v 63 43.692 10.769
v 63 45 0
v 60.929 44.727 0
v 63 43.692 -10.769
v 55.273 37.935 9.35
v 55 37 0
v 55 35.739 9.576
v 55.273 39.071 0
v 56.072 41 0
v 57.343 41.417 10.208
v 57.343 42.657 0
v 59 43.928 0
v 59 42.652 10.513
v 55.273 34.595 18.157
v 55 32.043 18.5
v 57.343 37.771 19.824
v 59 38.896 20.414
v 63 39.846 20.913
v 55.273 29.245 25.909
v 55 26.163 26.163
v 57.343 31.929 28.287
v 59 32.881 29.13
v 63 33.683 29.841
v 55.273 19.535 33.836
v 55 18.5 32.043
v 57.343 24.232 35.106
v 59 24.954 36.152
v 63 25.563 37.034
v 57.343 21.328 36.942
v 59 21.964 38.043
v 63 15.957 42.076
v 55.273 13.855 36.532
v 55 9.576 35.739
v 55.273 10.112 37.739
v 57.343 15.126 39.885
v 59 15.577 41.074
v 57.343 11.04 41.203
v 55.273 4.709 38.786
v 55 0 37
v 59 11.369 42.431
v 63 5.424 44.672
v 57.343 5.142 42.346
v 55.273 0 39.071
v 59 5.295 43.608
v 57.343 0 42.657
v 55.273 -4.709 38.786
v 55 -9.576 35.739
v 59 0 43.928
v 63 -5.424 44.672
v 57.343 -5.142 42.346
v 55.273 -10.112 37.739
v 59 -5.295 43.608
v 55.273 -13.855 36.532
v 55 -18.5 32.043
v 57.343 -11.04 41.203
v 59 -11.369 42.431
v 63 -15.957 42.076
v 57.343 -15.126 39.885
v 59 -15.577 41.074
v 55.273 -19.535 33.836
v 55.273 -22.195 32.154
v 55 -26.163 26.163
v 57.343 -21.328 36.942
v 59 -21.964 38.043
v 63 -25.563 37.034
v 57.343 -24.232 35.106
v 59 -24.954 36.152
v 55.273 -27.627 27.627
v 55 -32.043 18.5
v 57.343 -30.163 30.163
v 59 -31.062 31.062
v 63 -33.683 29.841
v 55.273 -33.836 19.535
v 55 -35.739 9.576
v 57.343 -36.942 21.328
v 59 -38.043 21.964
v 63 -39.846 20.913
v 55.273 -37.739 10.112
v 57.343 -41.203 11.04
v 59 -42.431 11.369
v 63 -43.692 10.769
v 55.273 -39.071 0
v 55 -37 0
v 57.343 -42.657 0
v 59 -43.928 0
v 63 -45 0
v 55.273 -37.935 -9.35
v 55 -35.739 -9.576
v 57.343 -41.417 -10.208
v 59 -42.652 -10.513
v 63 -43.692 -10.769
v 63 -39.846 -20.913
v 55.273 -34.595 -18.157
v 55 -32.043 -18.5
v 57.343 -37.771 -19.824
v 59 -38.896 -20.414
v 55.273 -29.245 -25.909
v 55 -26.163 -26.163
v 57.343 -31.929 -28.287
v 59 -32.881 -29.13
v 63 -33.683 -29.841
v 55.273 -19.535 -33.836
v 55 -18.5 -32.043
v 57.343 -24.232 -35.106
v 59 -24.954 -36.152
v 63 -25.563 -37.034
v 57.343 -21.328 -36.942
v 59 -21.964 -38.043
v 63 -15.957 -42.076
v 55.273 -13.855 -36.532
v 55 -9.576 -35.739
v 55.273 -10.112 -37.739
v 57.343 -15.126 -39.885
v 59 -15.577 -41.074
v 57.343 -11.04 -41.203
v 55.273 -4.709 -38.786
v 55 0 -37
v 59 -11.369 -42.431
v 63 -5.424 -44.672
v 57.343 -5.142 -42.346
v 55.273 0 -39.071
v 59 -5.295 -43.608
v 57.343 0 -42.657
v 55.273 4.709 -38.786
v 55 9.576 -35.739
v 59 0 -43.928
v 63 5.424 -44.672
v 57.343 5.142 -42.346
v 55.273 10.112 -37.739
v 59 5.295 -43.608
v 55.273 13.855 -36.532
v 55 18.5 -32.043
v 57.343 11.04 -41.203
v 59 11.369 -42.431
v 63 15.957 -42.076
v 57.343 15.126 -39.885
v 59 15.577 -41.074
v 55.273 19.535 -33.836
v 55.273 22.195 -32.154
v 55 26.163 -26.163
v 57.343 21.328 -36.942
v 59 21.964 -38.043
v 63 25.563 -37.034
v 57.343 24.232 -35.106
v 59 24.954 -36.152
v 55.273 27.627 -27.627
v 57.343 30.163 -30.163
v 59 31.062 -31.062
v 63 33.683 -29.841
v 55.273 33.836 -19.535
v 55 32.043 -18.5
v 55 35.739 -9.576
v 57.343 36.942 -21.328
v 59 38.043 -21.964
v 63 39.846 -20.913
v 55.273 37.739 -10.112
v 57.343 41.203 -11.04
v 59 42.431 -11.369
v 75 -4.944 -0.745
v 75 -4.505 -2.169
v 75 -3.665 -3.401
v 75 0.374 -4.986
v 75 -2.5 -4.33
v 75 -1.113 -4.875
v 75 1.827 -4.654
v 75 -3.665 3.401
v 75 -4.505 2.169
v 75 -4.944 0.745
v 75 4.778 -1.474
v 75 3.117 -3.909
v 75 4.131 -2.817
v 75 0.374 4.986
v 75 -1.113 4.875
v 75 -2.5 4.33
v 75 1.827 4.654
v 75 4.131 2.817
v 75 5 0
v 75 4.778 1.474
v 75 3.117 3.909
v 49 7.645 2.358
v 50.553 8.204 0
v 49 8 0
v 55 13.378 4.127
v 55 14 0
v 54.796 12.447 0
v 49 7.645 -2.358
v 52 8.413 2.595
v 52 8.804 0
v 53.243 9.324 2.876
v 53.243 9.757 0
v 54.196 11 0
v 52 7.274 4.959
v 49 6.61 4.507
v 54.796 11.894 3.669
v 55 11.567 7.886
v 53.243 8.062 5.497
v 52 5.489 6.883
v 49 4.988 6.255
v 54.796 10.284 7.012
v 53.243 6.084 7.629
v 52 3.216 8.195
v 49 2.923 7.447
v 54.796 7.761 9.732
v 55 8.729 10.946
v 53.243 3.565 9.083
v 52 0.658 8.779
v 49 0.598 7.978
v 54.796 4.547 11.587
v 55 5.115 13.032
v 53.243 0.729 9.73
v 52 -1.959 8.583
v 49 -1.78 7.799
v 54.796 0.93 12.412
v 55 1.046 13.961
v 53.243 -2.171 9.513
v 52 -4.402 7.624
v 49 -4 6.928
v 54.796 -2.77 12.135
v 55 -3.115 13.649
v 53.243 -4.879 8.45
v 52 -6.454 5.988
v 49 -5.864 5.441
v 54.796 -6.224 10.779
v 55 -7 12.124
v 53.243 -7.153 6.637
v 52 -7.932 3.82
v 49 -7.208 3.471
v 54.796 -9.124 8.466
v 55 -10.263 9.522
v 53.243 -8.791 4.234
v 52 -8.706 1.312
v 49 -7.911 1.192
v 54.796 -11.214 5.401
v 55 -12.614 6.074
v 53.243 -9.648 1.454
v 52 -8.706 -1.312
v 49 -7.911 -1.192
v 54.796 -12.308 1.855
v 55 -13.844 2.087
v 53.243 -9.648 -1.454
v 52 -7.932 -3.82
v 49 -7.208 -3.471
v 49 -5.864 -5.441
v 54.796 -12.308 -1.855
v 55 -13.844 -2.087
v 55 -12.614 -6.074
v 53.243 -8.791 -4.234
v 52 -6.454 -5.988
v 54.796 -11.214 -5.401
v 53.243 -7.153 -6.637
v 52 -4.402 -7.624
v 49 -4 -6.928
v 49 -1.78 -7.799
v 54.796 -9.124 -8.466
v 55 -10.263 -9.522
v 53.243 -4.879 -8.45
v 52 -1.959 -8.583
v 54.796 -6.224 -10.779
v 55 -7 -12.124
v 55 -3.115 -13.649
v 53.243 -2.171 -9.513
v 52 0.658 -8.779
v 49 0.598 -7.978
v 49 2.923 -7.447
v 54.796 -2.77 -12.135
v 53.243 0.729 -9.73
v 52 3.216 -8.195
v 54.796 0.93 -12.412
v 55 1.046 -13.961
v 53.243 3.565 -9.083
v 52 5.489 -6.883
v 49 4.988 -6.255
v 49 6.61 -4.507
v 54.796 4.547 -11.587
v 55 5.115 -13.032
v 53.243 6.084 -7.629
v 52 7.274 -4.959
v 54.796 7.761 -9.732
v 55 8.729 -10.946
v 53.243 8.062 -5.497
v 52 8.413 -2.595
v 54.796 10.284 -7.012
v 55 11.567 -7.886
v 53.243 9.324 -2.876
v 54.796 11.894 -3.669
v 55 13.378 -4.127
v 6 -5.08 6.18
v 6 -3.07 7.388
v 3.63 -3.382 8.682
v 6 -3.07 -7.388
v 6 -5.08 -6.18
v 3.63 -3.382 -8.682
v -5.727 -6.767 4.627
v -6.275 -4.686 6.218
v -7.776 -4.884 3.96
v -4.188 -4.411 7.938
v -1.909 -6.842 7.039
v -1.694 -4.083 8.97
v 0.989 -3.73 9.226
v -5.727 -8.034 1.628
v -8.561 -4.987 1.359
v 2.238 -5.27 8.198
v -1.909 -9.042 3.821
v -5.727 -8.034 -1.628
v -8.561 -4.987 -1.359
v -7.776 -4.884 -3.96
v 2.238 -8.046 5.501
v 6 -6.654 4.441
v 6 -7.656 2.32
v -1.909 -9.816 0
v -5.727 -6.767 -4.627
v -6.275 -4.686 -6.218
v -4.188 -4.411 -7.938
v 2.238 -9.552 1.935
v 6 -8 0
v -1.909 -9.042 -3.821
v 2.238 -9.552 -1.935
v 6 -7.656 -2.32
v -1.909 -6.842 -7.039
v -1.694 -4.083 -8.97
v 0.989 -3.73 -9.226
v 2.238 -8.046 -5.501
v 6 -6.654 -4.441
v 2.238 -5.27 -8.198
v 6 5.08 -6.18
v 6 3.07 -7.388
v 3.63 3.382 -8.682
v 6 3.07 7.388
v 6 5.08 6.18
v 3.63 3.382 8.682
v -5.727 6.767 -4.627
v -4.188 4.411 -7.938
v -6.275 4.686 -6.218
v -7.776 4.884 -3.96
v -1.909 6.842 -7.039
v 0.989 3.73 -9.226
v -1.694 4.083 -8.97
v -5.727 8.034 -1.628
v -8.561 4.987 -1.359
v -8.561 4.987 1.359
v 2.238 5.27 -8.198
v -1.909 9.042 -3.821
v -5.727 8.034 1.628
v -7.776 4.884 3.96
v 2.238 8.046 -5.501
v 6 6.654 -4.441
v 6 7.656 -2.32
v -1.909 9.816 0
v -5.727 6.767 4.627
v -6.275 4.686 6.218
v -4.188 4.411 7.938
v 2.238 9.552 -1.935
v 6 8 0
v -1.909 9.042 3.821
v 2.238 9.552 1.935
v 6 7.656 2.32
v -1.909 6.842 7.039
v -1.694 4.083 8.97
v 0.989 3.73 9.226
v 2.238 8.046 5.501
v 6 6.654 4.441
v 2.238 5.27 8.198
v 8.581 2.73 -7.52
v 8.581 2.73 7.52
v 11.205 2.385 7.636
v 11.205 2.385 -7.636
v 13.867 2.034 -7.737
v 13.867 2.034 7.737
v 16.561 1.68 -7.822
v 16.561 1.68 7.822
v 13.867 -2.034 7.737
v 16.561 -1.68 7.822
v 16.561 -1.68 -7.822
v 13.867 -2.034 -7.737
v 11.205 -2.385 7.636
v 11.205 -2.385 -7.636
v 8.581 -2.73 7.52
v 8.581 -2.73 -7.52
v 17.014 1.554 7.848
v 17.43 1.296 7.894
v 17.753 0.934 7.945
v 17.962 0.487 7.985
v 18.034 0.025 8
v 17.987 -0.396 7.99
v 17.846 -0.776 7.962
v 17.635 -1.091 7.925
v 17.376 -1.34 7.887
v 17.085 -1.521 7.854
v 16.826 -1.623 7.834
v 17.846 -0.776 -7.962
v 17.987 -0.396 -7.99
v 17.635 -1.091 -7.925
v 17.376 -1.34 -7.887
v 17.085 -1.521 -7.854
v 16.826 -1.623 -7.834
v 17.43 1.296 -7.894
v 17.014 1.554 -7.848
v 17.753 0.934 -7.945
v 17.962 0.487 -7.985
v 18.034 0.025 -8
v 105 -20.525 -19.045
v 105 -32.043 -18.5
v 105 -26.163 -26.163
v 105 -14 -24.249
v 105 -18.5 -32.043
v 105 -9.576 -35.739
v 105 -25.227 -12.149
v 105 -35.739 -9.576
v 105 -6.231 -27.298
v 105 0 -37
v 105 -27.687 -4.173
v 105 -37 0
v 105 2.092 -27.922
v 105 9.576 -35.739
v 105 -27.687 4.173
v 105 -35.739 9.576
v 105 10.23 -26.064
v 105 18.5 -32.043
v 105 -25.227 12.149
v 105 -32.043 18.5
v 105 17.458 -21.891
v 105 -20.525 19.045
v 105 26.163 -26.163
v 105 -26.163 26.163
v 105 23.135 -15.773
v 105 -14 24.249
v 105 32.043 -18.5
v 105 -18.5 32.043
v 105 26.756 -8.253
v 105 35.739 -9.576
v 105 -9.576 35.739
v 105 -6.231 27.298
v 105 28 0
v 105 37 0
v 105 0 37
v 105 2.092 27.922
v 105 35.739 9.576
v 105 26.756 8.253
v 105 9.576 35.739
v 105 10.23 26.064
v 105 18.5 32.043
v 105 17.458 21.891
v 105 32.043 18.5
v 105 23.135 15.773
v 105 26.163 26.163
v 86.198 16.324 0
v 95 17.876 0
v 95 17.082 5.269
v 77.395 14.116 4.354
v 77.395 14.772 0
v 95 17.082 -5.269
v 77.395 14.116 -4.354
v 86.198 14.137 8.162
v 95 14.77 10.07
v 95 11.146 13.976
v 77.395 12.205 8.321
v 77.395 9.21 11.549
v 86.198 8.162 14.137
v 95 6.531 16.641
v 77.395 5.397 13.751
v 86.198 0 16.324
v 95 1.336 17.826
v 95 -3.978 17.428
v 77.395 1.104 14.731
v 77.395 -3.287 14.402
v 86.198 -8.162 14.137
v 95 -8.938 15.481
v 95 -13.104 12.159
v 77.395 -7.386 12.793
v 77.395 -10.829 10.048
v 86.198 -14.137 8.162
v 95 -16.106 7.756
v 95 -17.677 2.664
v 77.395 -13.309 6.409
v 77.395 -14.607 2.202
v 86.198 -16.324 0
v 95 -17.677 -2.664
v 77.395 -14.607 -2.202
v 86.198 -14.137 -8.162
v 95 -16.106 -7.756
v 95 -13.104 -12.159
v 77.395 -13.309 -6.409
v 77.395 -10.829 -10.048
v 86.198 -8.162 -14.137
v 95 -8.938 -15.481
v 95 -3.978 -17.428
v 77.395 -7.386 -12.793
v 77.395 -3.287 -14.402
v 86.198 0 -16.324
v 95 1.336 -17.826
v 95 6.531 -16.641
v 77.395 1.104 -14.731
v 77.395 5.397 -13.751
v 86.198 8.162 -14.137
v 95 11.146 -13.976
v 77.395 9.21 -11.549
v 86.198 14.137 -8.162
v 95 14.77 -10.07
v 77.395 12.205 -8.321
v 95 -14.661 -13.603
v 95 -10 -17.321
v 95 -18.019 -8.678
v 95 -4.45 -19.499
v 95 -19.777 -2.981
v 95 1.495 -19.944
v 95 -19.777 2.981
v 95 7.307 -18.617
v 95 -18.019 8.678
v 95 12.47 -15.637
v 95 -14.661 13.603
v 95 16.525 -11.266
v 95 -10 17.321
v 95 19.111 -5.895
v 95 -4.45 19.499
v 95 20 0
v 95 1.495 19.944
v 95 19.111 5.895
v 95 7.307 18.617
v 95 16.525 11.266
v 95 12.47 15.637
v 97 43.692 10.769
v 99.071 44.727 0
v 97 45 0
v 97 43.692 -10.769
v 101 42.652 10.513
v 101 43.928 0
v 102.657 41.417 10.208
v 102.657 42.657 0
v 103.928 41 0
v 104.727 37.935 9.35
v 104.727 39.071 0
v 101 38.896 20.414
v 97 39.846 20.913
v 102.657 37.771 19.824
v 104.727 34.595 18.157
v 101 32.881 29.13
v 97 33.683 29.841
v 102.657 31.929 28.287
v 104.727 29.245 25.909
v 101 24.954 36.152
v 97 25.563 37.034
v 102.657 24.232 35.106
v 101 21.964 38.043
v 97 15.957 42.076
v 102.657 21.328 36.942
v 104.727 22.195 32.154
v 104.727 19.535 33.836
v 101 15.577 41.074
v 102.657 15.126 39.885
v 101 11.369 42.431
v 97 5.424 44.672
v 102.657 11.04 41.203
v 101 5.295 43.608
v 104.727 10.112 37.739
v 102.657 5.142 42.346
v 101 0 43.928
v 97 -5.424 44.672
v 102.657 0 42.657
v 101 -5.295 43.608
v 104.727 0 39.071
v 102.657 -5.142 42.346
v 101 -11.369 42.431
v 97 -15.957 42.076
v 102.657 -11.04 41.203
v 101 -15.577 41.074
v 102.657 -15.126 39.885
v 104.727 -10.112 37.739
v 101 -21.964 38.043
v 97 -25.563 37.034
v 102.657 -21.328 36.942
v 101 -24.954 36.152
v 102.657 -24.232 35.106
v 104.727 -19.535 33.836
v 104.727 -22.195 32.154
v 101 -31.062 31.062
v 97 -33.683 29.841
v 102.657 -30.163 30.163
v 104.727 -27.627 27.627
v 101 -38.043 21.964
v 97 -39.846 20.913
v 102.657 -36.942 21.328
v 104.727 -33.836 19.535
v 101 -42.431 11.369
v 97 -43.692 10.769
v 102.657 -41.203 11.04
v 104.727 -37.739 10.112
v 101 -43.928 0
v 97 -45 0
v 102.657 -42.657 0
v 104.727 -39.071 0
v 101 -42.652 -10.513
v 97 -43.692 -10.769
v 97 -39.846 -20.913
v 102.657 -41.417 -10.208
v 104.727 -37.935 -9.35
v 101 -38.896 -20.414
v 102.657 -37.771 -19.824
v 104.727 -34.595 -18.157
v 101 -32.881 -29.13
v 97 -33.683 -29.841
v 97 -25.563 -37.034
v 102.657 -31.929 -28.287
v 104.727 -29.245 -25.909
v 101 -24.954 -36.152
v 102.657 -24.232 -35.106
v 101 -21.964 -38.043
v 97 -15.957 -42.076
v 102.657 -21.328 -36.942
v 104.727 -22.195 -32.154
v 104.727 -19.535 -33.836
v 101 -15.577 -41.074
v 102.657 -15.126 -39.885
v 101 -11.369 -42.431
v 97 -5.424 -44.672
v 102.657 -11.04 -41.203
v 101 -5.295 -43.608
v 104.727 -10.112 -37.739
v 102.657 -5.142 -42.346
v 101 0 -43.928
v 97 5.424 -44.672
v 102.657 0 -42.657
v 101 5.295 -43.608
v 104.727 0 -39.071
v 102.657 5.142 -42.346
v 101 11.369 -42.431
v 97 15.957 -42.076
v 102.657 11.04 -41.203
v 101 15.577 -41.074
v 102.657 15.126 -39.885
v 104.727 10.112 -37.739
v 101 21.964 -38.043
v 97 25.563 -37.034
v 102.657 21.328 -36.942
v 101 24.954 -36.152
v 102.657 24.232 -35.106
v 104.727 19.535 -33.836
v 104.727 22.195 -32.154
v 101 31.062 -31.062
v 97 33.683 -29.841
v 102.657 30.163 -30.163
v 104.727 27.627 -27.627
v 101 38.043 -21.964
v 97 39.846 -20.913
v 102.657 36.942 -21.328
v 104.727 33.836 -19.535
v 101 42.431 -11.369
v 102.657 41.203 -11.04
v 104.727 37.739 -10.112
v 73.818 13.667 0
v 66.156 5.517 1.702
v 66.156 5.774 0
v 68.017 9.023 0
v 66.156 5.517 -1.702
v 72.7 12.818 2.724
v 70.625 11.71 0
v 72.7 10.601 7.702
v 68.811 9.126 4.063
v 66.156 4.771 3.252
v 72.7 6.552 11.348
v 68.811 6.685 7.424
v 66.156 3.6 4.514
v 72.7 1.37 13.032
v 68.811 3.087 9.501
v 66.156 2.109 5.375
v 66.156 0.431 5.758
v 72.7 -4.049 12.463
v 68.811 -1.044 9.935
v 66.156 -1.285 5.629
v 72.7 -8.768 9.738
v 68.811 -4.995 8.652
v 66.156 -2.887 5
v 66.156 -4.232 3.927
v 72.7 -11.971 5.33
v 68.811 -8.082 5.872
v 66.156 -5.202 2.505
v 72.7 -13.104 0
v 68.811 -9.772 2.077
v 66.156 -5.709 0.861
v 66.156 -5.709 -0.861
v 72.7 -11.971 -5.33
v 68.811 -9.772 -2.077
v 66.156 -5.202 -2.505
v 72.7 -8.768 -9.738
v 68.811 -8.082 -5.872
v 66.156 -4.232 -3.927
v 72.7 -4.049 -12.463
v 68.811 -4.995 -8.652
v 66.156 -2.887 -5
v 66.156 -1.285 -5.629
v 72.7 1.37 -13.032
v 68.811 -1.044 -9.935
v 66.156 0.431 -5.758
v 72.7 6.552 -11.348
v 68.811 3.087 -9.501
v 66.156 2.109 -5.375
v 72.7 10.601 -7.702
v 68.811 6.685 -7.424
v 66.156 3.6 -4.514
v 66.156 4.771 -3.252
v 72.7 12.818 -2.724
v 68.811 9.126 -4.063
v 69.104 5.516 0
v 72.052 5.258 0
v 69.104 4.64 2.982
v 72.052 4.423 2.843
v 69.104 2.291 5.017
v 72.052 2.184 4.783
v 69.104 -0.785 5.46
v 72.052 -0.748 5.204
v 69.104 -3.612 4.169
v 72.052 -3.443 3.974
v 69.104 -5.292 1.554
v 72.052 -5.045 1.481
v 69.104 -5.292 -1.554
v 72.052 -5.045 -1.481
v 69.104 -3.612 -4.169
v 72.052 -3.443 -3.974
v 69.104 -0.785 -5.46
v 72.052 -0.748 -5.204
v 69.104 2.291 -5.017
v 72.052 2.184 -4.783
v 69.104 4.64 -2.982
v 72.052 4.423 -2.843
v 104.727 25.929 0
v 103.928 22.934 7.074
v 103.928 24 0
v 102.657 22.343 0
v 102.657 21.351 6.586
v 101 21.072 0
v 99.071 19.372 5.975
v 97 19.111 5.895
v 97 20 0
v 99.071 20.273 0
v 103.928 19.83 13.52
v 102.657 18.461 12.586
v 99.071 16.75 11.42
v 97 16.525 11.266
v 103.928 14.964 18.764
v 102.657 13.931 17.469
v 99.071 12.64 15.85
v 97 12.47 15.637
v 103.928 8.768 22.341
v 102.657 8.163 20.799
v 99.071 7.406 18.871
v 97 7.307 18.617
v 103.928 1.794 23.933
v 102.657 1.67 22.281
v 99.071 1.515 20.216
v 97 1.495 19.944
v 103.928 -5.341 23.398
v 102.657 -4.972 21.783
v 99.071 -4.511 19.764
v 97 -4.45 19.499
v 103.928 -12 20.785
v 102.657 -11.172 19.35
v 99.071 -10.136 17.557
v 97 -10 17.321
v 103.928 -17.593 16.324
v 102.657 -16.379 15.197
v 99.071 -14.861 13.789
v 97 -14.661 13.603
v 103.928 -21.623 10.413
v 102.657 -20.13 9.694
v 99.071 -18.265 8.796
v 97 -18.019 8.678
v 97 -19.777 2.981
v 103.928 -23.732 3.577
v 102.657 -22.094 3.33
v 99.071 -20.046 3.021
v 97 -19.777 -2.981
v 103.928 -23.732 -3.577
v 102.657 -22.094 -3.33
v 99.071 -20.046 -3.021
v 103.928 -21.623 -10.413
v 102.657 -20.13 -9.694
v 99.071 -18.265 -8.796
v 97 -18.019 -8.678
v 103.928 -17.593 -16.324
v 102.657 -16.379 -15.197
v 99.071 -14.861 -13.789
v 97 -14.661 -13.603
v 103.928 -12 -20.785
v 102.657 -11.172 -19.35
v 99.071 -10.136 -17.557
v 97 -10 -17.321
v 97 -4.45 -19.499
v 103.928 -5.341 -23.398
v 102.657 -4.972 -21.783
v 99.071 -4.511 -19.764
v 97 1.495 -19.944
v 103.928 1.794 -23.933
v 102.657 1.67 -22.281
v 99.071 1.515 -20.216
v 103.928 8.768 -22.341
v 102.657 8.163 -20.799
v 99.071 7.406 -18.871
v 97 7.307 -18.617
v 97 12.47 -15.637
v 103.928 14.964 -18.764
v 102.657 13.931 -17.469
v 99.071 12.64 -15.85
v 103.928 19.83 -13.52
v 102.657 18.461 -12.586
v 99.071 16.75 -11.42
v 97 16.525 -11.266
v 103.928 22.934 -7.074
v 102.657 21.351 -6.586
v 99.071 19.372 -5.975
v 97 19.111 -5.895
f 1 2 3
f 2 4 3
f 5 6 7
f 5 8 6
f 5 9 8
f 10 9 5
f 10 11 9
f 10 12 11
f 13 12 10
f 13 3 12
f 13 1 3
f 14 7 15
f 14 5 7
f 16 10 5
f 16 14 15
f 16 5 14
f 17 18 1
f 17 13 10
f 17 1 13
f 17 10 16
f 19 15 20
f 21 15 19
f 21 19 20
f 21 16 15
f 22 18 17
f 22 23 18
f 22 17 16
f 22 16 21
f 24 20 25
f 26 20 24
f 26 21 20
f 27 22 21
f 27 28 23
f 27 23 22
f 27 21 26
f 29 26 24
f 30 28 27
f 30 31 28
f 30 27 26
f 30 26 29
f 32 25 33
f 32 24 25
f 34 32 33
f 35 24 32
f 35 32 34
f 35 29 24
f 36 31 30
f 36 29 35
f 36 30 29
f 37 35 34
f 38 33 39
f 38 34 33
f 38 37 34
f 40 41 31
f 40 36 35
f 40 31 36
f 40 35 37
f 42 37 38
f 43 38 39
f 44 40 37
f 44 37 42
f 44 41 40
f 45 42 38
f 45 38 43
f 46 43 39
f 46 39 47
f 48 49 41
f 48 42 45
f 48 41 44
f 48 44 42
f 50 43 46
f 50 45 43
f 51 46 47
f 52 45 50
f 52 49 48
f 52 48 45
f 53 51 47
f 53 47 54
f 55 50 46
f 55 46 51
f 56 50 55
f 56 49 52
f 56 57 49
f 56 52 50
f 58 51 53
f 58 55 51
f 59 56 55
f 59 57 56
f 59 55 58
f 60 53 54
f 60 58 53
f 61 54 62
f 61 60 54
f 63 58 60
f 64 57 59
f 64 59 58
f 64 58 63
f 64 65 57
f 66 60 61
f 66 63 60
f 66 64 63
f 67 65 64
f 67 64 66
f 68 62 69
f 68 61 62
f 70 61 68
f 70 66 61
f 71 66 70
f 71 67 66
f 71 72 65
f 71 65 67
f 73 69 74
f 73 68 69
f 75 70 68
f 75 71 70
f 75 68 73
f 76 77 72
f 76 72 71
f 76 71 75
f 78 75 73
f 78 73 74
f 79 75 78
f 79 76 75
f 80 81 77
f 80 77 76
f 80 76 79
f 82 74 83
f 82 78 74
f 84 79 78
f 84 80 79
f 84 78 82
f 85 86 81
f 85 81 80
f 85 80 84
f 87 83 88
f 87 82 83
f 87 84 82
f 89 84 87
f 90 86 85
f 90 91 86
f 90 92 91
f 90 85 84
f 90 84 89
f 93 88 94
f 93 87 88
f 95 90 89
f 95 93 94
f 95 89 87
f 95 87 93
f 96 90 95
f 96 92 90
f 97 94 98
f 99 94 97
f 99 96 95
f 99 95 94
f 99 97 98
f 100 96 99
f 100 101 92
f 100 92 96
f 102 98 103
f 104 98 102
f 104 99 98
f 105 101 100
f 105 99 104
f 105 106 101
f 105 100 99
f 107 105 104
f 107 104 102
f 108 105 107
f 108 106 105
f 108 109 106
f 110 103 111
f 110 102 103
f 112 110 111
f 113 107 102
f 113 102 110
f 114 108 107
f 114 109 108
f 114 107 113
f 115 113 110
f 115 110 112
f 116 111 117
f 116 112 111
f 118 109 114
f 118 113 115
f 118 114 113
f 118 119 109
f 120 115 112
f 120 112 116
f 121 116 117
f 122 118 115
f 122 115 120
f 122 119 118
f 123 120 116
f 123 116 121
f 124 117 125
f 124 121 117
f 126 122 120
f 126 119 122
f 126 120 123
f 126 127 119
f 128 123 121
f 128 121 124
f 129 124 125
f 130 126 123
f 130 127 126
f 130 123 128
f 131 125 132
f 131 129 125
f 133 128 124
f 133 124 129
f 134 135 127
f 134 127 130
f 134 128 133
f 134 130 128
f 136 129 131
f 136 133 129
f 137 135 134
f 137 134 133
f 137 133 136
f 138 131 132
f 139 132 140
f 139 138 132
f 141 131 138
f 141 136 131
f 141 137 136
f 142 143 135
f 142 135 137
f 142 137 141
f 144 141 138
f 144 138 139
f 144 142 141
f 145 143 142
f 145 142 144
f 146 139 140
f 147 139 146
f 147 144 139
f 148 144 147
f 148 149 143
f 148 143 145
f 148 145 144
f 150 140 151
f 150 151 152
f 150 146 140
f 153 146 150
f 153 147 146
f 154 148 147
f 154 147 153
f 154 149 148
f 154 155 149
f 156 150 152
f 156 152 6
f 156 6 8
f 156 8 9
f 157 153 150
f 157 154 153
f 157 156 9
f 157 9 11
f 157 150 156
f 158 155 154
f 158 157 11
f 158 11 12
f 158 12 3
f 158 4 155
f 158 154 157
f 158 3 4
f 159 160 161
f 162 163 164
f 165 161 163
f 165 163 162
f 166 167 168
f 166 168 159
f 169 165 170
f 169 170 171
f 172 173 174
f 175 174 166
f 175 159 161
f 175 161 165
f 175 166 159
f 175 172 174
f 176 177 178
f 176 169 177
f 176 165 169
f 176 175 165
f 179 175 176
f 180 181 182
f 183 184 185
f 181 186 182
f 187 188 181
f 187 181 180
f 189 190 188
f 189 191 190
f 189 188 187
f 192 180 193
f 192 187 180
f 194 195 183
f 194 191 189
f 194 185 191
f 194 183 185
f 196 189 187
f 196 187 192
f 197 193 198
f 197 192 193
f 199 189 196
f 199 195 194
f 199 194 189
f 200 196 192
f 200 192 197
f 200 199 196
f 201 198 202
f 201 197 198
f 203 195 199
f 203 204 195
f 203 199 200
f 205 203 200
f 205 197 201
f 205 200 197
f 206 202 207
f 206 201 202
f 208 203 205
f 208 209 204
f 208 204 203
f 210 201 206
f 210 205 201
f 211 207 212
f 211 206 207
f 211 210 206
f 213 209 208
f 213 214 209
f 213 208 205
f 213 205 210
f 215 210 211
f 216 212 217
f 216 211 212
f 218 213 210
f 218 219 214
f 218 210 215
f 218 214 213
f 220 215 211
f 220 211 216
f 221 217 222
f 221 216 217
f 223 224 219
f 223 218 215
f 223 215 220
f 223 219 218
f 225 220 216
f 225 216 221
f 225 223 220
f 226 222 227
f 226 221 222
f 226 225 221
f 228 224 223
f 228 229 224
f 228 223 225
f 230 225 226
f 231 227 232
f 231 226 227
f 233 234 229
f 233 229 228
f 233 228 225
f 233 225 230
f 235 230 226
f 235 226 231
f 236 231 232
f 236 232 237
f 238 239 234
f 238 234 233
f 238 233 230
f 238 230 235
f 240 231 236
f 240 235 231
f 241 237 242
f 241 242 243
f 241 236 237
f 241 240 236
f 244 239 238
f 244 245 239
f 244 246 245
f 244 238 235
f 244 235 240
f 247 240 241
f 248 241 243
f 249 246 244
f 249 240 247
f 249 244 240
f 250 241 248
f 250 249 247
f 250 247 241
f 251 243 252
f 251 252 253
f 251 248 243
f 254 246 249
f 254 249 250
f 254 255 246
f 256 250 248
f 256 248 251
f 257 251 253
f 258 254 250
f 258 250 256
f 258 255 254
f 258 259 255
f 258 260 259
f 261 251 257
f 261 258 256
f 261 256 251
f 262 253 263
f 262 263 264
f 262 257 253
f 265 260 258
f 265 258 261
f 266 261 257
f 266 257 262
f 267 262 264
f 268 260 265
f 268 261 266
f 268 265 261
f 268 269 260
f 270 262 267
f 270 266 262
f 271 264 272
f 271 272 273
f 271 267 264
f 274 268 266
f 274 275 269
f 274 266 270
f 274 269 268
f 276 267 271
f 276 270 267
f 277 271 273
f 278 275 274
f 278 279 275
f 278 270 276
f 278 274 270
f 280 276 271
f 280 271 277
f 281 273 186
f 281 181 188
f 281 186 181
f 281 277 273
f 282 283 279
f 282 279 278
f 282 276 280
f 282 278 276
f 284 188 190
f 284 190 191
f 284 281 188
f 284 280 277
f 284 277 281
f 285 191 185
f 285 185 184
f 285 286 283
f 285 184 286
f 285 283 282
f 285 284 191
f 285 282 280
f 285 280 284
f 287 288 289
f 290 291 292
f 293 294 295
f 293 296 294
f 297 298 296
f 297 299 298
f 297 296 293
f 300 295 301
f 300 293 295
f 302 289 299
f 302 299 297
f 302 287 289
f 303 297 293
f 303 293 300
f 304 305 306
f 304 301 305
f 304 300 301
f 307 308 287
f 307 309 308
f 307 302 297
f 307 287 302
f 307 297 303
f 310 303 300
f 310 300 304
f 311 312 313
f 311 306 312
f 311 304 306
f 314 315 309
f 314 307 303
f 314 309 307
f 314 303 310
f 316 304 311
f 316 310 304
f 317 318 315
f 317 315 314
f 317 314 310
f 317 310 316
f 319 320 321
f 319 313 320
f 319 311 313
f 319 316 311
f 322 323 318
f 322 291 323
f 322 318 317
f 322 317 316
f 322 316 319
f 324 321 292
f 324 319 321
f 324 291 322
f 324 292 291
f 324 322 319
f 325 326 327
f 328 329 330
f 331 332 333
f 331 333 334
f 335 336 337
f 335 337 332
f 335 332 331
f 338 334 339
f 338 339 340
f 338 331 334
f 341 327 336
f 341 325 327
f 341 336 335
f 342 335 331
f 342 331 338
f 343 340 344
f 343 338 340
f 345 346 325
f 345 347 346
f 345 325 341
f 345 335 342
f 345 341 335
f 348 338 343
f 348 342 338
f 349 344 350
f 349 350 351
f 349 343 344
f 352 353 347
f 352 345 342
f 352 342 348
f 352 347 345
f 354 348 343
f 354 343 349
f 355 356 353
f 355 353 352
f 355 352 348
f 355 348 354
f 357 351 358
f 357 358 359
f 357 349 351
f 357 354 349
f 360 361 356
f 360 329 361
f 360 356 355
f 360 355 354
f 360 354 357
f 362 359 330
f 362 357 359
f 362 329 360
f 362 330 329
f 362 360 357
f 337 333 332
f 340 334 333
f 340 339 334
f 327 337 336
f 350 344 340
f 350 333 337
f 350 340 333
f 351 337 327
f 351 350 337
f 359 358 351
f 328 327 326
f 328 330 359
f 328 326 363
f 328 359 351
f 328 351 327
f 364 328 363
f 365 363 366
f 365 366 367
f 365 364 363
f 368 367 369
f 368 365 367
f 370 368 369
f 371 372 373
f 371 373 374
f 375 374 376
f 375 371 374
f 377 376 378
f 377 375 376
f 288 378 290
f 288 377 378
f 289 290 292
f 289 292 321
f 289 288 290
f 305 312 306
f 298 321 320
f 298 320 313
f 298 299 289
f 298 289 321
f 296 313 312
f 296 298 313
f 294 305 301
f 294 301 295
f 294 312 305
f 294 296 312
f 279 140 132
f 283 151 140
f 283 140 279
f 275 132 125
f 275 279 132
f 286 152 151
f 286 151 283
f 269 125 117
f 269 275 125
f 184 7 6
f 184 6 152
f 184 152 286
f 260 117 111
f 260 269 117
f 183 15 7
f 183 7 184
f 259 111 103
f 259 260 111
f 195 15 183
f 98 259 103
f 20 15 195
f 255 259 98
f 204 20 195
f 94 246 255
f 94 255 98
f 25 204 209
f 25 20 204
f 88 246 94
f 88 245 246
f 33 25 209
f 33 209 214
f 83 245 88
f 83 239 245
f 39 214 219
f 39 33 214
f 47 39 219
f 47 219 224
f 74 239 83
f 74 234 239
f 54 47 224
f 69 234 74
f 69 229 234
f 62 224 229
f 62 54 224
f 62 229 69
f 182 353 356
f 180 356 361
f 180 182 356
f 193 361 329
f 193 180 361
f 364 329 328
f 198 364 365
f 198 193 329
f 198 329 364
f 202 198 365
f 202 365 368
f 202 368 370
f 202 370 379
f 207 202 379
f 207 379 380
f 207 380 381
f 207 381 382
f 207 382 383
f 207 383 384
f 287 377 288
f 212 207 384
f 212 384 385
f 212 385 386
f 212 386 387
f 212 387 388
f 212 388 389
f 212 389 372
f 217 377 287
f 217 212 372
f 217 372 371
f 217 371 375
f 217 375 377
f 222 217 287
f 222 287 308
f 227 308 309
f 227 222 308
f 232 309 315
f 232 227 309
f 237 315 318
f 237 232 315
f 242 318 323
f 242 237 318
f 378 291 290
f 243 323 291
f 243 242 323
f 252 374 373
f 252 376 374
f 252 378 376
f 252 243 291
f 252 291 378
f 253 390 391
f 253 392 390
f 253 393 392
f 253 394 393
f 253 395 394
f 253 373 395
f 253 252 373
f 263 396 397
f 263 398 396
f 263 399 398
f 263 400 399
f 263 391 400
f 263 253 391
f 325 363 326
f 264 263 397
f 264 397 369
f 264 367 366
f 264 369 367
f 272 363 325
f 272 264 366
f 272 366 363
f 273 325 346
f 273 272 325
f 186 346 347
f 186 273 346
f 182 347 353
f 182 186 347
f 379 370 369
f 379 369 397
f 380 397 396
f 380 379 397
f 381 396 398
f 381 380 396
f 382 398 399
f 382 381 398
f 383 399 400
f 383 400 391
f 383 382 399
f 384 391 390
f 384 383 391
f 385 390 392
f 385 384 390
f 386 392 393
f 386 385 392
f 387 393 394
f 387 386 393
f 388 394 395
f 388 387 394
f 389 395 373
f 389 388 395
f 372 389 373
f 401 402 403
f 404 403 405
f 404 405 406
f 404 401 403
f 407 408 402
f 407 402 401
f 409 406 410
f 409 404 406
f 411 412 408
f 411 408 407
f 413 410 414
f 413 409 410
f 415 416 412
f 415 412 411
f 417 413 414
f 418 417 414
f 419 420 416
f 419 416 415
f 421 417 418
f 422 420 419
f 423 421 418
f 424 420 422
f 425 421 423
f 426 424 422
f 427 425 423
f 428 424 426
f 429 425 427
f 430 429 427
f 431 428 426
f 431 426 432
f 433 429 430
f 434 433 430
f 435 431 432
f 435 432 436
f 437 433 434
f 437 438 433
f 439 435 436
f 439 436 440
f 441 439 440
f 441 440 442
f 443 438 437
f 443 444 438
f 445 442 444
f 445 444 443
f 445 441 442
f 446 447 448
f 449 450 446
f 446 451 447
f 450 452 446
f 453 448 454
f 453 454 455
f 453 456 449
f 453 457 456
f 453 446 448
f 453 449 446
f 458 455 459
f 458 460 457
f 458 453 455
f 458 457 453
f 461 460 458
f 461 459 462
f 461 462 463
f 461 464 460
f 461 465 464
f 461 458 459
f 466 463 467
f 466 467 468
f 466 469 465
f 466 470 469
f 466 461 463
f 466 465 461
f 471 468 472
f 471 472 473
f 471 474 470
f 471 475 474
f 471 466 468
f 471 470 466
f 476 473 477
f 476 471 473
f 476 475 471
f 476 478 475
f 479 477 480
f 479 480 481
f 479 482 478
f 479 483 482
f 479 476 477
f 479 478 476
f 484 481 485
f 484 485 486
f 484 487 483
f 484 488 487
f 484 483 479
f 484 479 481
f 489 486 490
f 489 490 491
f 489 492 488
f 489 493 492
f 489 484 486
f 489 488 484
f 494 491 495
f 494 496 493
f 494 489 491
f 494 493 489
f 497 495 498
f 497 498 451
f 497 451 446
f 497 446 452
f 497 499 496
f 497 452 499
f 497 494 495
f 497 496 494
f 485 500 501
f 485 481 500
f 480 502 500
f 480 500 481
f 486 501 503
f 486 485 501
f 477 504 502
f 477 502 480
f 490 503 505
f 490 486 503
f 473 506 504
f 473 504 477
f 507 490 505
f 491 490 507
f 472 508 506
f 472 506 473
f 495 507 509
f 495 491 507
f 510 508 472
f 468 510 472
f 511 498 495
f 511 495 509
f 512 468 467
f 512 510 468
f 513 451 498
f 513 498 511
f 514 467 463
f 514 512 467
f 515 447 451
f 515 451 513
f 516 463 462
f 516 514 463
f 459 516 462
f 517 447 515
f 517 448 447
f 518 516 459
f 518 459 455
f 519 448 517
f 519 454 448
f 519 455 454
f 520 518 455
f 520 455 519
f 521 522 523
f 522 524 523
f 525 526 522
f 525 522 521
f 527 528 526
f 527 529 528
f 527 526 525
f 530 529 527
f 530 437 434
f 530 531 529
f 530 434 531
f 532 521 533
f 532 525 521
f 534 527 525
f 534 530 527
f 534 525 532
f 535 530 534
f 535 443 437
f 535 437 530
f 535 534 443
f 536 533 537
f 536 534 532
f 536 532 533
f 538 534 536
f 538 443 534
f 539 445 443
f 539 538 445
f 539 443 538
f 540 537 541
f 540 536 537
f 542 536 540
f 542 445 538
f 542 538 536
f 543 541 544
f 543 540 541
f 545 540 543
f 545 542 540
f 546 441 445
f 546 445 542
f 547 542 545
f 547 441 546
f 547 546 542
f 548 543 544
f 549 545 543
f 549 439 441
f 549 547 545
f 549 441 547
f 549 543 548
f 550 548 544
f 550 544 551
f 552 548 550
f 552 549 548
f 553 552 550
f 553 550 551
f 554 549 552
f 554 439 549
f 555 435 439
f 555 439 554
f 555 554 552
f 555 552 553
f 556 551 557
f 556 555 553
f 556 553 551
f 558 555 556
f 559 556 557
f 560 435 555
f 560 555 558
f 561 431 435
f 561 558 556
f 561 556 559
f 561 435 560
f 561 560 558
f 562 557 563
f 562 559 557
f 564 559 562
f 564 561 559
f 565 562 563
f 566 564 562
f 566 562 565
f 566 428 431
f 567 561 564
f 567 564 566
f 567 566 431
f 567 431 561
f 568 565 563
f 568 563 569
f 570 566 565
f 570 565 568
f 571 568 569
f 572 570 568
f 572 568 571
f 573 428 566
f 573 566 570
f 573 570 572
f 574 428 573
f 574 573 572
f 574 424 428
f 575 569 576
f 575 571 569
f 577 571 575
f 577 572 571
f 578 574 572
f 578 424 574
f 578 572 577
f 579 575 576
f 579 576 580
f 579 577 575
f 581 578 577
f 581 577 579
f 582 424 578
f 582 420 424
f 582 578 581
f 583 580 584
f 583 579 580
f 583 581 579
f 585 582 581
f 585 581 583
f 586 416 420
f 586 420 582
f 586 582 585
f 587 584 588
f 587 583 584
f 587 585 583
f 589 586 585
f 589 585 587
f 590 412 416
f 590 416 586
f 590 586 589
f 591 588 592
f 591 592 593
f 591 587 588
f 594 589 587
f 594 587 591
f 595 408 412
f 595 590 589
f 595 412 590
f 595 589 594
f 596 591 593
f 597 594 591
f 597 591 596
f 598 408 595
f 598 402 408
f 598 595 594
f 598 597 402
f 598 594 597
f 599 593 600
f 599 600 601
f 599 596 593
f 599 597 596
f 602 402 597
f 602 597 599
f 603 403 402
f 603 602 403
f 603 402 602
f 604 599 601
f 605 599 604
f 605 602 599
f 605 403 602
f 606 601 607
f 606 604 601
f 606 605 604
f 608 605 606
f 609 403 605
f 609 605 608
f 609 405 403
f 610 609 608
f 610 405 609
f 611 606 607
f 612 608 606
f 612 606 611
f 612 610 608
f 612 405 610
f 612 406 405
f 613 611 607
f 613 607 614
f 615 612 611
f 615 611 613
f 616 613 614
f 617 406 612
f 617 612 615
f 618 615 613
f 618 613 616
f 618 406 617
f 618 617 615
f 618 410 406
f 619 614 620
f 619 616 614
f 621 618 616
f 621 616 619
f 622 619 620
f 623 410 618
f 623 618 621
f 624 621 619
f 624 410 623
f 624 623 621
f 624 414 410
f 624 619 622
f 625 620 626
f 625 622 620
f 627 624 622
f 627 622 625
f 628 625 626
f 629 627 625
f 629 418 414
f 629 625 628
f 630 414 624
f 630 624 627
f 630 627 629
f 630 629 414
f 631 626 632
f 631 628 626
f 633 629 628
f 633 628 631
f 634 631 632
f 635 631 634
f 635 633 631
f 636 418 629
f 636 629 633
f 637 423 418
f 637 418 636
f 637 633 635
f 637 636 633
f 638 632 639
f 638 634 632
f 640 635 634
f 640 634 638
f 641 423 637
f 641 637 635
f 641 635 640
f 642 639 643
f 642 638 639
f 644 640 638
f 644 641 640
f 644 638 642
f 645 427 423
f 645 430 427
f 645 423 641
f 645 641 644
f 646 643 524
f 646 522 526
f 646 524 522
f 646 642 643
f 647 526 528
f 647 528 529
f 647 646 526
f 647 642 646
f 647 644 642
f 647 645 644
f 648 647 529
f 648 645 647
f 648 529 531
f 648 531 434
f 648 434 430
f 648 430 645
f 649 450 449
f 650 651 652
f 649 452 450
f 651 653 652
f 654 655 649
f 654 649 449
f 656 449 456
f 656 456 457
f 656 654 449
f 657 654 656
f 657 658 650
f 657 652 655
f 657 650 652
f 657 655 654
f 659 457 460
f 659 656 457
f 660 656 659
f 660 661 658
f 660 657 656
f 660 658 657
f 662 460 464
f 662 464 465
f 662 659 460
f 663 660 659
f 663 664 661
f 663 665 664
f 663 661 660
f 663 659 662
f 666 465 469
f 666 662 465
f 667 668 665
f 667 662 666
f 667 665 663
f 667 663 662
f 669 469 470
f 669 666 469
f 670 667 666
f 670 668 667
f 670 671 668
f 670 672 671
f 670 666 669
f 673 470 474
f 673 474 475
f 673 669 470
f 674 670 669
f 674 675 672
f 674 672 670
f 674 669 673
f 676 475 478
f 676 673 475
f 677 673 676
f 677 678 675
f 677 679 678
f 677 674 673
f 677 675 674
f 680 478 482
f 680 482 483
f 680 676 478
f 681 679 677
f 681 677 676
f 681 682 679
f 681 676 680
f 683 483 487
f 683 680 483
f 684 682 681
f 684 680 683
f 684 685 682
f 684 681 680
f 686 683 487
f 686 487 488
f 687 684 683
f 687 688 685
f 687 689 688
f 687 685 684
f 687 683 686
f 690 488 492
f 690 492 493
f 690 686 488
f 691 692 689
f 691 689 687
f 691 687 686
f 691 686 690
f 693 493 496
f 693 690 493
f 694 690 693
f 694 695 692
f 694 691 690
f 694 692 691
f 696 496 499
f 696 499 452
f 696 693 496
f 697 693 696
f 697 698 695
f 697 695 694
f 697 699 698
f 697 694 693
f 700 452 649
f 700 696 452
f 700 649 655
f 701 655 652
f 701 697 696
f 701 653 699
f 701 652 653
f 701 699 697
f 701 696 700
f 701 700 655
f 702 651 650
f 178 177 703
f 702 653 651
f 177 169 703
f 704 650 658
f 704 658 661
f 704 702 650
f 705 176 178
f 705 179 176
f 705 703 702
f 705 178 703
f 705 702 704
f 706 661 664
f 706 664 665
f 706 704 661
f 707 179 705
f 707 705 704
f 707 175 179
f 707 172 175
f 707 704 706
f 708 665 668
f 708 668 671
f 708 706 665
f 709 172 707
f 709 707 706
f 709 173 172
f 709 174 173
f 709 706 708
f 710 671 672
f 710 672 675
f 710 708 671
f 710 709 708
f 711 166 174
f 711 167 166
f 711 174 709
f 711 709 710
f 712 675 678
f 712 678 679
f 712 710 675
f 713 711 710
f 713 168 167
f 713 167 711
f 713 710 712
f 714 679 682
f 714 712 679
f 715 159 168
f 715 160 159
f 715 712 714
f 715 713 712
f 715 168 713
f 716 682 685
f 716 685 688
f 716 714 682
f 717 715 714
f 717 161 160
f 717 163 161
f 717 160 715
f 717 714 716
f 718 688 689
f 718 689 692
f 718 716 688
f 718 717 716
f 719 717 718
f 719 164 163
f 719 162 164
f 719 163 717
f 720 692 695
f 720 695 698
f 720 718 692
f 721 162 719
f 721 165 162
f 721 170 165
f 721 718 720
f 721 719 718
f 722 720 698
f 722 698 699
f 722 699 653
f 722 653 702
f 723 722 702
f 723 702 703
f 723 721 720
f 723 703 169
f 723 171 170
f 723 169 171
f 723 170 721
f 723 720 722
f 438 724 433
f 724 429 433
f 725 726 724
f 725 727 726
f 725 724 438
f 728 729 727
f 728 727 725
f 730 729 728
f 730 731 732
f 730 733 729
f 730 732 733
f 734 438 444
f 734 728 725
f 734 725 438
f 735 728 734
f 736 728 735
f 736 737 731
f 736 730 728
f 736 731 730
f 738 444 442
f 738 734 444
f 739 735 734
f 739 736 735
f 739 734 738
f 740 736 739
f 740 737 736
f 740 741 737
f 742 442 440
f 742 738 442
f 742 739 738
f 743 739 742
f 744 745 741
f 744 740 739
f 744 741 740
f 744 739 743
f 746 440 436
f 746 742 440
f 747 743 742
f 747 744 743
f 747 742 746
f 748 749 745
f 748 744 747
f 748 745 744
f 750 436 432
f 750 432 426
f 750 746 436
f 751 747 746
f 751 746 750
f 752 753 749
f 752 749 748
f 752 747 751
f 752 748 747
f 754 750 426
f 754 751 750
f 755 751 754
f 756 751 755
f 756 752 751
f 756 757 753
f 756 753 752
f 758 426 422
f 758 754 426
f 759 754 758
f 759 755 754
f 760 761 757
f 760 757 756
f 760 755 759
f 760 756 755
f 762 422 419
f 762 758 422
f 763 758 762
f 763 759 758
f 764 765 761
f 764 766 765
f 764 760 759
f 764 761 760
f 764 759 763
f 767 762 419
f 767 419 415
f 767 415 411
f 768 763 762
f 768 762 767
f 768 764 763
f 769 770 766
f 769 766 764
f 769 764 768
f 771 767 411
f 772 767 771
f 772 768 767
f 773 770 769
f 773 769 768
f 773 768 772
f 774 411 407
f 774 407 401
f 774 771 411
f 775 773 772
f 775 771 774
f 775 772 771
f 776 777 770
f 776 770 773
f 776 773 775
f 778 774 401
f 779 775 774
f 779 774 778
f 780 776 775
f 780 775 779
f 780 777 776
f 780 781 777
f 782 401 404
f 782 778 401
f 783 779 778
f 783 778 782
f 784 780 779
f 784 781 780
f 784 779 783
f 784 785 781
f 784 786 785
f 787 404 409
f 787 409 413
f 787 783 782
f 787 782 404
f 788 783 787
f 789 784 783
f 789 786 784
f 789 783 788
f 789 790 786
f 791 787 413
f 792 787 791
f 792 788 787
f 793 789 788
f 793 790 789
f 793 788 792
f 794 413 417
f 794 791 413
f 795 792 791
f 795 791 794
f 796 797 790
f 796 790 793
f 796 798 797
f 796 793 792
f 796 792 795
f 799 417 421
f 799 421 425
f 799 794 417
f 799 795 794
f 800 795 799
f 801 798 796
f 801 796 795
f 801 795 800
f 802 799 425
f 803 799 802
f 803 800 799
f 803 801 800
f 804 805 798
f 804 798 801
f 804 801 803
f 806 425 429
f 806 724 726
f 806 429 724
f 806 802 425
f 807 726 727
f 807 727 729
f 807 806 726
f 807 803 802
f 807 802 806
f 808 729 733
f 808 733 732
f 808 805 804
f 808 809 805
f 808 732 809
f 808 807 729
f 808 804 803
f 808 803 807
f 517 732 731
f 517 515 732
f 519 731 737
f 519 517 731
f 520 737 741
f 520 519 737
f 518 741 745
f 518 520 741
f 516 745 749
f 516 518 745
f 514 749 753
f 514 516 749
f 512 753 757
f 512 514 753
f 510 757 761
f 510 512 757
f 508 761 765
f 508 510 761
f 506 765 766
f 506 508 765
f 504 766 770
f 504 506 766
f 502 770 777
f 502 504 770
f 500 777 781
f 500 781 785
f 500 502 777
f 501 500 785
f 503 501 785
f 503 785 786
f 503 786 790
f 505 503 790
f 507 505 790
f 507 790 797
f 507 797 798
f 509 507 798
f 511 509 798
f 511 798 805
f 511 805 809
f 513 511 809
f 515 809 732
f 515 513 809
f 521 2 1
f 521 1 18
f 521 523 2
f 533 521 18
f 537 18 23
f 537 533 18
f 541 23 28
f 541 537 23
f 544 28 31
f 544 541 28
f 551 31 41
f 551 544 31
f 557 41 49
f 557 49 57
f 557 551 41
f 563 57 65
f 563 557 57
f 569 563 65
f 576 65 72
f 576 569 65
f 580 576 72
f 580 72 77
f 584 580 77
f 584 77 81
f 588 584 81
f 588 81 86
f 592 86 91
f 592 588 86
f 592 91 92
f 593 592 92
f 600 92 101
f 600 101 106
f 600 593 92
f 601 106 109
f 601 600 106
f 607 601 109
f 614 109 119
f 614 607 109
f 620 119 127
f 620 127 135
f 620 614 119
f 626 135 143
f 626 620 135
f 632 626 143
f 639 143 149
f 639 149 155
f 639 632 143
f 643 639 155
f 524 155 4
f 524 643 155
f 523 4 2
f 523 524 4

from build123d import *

# Parameters (mm, degrees)
CUT_EXTRUDE_1_DEPTH      = 46
CUT_EXTRUDE_1_DEPTH_BACK = 46


with BuildPart() as part:
    # 草圖1 → 旋轉1 (revolve)
    with BuildSketch(Plane.XY):
        with BuildLine():
            Line((6, 8), (49, 8))
            ThreePointArc((49, 8), (53.242640687, 9.757359313), (55, 14))
            Line((55, 14), (55, 37))
            ThreePointArc((55, 37), (57.343145751, 42.656854249), (63, 45))
            Line((63, 45), (97, 45))
            ThreePointArc((97, 45), (102.656854249, 42.656854249), (105, 37))
            Line((105, 37), (105, 28))
            ThreePointArc((105, 28), (102.656854249, 22.343145751), (97, 20))
            Line((97, 20), (95, 20))
            Line((95, 20), (95, 17.876303889))
            Line((95, 17.876303889), (77.395277335, 14.772116295))
            ThreePointArc((77.395277335, 14.772116295), (70.625310141, 11.709619552), (66.155739431, 5.773772537))
            Line((66.155739431, 5.773772537), (75, 5))
            Line((75, 5), (75, 0))
            Line((75, 0), (-10, 0))
            ThreePointArc((-10, 0), (-4.472135955, 8.94427191), (6, 8))
        make_face()
    revolve(axis=Axis((0, 0, 0), (1, 0, 0)))

    # 草圖2 → 除料-伸長1 (cut, two sides)
    with BuildSketch(Plane.XY) as cut_extrude_1_sk:
        with BuildLine():
            Line((-264.793827917, 38.720624717), (-8.660254038, 5))
            Line((-8.660254038, 5), (16.560866404, 1.679576502))
            ThreePointArc((16.560866404, 1.679576502), (18.033815464, 0), (16.560866404, -1.679576502))
            Line((16.560866404, -1.679576502), (-8.660254038, -5))
            Line((-8.660254038, -5), (-264.793827917, -38.720624717))
            Line((-264.793827917, -38.720624717), (-781.481308701, -38.720624717))
            Line((-781.481308701, -38.720624717), (-781.481308701, 38.720624717))
            Line((-781.481308701, 38.720624717), (-264.793827917, 38.720624717))
        make_face()
    extrude(amount=CUT_EXTRUDE_1_DEPTH, mode=Mode.SUBTRACT)
    extrude(cut_extrude_1_sk.sketch, amount=-CUT_EXTRUDE_1_DEPTH_BACK, mode=Mode.SUBTRACT)


solid = part.part
